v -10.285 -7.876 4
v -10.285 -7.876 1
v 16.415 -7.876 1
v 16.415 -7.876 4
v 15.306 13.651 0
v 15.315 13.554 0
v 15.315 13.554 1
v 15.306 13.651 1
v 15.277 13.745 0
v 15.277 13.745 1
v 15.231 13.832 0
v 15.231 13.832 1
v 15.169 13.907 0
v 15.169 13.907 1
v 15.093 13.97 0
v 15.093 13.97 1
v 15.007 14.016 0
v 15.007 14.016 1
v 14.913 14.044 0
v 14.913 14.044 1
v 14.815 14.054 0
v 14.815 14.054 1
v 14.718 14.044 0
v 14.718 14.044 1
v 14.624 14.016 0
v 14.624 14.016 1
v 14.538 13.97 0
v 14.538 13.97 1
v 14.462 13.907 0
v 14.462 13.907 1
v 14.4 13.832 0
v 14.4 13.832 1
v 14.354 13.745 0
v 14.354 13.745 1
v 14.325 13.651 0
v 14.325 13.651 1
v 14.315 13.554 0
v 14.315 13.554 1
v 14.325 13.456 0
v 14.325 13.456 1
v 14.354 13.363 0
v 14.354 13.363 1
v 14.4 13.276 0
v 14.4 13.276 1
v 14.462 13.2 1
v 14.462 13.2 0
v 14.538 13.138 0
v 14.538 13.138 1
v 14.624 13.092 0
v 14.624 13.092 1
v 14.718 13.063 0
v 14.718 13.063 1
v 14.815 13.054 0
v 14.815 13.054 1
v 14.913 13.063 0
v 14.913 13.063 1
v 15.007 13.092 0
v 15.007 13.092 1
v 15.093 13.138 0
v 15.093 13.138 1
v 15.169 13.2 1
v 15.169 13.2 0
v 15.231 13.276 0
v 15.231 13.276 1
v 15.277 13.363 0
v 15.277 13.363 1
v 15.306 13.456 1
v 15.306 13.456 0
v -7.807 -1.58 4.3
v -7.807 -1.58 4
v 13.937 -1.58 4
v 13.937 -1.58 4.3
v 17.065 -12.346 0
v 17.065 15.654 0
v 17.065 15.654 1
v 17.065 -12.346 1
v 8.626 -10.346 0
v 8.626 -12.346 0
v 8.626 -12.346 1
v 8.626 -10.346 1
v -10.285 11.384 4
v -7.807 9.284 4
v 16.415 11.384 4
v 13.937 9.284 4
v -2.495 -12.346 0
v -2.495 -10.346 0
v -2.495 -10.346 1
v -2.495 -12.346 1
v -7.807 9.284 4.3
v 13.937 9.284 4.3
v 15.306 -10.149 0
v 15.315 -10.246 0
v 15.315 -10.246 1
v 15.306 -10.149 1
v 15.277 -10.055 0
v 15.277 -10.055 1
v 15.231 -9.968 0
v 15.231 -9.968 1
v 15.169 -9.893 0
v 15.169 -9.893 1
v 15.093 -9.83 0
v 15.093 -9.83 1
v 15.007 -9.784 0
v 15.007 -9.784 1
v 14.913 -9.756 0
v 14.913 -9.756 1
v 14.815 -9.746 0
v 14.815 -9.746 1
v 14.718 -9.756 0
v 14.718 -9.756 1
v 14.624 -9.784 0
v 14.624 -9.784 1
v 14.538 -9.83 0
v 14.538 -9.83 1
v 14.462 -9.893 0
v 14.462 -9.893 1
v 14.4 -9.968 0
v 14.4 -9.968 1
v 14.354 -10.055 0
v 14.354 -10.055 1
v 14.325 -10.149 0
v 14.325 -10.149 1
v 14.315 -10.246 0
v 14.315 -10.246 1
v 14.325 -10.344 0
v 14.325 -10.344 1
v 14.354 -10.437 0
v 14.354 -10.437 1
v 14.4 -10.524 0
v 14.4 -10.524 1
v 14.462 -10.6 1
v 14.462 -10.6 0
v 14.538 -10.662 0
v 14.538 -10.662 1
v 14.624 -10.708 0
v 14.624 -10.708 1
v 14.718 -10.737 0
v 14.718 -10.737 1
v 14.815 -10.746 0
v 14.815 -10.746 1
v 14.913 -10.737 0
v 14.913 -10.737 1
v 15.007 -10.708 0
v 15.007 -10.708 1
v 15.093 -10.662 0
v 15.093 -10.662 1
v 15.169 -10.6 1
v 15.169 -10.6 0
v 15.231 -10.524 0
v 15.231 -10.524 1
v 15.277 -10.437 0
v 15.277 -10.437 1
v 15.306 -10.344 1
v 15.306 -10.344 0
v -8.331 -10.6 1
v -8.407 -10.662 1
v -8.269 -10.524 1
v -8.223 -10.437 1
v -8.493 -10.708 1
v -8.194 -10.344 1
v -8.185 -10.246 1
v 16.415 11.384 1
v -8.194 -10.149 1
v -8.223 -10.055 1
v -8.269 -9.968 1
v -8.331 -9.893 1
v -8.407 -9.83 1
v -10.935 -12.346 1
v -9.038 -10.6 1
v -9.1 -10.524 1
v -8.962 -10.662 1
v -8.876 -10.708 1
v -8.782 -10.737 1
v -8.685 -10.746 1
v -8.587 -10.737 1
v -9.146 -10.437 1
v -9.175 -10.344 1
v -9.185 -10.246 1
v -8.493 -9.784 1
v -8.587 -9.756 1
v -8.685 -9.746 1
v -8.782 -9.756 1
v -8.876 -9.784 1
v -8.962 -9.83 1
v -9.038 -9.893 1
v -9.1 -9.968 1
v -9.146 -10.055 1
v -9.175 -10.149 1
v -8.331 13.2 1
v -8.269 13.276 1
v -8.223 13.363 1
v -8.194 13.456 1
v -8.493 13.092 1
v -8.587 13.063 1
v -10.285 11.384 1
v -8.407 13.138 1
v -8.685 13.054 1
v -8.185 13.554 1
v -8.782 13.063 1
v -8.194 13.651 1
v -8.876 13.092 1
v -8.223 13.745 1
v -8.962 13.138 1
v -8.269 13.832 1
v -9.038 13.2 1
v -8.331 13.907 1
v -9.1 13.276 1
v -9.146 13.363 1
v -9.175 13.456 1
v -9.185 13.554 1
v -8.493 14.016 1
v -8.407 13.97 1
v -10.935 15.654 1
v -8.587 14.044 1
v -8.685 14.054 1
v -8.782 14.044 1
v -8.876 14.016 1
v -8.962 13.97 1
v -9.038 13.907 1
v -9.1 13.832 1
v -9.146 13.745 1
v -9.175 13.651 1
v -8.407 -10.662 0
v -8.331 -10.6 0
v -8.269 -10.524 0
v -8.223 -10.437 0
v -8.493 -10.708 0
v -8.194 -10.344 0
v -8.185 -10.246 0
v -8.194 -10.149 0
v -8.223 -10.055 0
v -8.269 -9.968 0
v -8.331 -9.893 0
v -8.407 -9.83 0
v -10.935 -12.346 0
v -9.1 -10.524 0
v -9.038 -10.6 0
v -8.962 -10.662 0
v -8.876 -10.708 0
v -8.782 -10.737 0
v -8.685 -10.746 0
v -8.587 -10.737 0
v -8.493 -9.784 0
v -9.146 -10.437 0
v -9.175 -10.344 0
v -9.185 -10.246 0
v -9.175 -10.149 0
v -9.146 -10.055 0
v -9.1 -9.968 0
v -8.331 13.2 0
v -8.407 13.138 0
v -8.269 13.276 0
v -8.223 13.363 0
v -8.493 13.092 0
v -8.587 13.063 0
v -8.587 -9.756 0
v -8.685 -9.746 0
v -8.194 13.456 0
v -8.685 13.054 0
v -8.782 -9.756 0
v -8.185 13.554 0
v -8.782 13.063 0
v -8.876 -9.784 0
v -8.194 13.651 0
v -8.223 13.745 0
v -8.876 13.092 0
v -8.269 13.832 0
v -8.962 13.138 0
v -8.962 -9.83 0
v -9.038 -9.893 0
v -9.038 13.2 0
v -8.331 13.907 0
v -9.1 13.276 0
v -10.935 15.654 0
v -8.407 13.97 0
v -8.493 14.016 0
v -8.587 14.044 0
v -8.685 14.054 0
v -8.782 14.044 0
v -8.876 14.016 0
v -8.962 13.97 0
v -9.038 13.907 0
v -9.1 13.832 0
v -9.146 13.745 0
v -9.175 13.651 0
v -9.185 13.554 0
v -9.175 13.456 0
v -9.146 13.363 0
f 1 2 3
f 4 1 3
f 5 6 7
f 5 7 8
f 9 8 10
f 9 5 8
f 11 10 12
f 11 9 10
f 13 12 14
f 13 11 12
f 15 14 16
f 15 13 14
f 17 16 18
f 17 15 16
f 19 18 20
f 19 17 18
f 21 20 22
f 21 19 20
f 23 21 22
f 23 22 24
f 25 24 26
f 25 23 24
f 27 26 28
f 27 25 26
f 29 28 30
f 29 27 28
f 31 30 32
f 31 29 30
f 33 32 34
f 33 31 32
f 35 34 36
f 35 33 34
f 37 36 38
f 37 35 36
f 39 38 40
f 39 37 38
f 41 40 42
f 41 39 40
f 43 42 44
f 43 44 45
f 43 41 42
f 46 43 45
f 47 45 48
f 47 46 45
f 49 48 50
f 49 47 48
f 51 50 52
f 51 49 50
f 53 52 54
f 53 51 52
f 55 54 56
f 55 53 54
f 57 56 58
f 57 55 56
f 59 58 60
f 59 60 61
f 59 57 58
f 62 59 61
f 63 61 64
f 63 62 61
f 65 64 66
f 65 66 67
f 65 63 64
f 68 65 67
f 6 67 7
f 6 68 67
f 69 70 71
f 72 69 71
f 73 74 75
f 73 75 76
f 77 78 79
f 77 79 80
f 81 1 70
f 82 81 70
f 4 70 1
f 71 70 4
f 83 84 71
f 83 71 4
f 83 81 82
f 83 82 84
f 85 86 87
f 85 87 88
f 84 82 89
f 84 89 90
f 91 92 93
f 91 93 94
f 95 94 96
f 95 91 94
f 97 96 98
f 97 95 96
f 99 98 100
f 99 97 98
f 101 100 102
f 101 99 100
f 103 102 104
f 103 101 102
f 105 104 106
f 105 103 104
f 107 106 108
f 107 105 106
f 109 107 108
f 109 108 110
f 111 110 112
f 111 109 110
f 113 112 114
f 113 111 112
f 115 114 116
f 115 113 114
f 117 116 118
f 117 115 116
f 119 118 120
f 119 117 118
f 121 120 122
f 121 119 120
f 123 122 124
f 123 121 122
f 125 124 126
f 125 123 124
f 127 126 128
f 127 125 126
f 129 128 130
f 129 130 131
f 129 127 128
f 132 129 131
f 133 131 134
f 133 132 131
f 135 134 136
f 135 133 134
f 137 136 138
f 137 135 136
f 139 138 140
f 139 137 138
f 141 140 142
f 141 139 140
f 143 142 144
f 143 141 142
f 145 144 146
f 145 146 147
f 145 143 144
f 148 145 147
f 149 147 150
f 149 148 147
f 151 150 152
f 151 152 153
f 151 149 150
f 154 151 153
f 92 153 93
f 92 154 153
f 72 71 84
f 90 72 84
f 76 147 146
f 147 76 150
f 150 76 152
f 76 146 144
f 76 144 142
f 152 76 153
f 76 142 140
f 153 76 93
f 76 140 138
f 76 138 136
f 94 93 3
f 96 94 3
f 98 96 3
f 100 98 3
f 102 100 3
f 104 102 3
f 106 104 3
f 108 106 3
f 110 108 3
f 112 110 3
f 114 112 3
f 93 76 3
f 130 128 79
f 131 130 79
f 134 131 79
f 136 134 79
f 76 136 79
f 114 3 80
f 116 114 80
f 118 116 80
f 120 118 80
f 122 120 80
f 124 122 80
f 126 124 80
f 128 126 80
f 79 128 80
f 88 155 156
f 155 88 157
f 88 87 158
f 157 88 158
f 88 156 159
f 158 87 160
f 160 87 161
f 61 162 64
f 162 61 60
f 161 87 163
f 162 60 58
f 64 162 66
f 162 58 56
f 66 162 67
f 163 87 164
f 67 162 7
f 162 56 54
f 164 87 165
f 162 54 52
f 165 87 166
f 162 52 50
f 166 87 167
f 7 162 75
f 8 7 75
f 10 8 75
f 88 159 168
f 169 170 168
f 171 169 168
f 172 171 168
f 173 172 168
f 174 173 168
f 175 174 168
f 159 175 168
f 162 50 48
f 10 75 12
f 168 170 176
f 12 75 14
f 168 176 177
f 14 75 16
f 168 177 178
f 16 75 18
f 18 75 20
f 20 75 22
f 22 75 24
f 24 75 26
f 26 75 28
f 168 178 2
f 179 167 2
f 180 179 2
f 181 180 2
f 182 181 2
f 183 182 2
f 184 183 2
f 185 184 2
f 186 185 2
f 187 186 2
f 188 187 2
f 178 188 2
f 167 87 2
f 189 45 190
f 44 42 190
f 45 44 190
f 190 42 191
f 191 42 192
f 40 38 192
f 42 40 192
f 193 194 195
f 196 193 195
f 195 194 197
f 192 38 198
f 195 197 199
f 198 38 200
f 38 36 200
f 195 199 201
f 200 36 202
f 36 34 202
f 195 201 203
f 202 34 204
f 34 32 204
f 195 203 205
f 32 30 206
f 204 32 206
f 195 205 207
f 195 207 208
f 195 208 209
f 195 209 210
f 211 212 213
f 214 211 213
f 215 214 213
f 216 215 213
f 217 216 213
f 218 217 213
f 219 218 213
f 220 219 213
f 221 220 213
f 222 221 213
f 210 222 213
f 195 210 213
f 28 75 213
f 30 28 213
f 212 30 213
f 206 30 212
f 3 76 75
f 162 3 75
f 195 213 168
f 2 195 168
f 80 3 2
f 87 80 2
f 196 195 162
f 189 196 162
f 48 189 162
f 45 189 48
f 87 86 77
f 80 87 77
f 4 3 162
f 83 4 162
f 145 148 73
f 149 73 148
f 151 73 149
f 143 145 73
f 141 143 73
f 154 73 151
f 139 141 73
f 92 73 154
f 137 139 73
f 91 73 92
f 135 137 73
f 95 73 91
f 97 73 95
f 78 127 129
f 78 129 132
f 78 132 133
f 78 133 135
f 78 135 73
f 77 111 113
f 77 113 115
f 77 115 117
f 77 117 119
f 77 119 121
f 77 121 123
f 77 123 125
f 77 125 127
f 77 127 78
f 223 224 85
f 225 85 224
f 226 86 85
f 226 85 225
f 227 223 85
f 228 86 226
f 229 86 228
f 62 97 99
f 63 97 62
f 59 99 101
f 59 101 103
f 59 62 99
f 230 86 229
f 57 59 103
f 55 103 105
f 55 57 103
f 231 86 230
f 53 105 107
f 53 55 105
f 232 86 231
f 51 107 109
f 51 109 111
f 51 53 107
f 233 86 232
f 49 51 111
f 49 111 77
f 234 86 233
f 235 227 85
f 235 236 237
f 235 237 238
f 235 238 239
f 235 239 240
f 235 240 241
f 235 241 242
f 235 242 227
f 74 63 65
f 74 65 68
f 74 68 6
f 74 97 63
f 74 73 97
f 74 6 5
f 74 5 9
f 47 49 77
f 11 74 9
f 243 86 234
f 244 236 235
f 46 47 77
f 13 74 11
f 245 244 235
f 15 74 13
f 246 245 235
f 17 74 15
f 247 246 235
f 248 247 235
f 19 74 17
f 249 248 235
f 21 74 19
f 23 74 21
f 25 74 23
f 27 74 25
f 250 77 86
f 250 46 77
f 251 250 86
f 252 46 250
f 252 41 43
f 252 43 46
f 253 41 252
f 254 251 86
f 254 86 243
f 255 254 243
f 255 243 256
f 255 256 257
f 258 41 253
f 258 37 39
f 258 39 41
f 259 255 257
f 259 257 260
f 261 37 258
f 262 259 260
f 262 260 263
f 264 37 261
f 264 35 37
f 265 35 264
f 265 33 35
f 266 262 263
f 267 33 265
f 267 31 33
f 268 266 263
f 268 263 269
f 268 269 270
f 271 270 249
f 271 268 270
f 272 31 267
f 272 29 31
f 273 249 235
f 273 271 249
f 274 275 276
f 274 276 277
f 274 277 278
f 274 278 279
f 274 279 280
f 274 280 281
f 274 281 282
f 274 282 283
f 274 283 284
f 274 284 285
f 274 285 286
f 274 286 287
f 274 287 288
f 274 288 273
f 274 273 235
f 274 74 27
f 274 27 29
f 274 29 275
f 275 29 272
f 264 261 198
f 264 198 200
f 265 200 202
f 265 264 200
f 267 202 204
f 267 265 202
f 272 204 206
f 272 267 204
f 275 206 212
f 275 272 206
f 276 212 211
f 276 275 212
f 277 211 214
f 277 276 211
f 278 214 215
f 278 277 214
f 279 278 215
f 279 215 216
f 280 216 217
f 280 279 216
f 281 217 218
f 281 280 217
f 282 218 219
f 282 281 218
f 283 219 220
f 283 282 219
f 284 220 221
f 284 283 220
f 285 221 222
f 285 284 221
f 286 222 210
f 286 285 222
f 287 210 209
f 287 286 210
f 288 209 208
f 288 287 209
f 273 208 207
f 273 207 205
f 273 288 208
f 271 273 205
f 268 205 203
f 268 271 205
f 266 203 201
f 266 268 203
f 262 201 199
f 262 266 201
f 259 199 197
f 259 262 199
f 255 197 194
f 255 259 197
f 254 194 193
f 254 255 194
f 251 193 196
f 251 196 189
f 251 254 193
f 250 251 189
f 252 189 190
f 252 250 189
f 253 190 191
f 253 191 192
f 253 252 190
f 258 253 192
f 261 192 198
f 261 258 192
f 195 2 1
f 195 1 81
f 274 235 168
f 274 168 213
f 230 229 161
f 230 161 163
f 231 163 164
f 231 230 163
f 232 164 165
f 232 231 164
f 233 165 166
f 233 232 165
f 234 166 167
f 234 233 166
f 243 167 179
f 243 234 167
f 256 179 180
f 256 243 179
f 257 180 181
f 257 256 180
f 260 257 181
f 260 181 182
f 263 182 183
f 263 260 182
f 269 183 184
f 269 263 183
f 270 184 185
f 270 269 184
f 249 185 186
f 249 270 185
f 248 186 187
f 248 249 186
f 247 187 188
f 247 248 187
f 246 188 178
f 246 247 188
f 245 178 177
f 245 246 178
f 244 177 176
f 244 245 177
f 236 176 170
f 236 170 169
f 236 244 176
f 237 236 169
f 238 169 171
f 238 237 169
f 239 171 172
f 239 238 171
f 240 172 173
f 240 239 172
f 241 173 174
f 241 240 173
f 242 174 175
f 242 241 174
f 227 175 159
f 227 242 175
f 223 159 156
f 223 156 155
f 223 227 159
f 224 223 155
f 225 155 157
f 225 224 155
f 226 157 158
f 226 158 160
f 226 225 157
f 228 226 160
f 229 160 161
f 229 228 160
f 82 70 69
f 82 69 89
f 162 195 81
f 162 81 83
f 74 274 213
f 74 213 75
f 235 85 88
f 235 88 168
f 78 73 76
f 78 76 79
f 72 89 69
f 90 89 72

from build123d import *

# Parameters (mm, degrees)
ESQUISSE1_R        = 0.5
BOSS_EXTRU_1_DEPTH = 1
ESQUISSE2_W        = 26.7
ESQUISSE2_H        = 19.26
BOSS_EXTRU_2_DEPTH = 3
ESQUISSE4_W        = 21.744
ESQUISSE4_H        = 10.864
BOSS_EXTRU_3_DEPTH = 0.3


with BuildPart() as part:
    # Esquisse1 → Boss.-Extru.1 (new body)
    with BuildSketch(Plane.XY):
        Polygon((-10.934549339, 15.65387995), (17.065450661, 15.65387995), (17.065450661, -12.34612005), (8.625947463, -12.34612005), (8.625947463, -10.34612005), (3.065450661, -10.34612005), (-2.495046141, -10.34612005), (-2.495046141, -12.34612005), (-10.934549339, -12.34612005), align=None)
        with Locations((-8.684549339, -10.24612005)):
            Circle(ESQUISSE1_R, mode=Mode.SUBTRACT)
        with Locations((-8.684549339, 13.55387995)):
            Circle(ESQUISSE1_R, mode=Mode.SUBTRACT)
        with Locations((14.815450661, 13.55387995)):
            Circle(ESQUISSE1_R, mode=Mode.SUBTRACT)
        with Locations((14.815450661, -10.24612005)):
            Circle(ESQUISSE1_R, mode=Mode.SUBTRACT)
    extrude(amount=BOSS_EXTRU_1_DEPTH)

    # Esquisse2 → Boss.-Extru.2 (add)
    with BuildSketch(Plane.XY.offset(1)):
        with Locations((3.065450661, 1.75387995)):
            Rectangle(ESQUISSE2_W, ESQUISSE2_H)
    extrude(amount=BOSS_EXTRU_2_DEPTH)

    # Esquisse4 → Boss.-Extru.3 (add)
    with BuildSketch(Plane.XY.offset(4)):
        with Locations((3.065450661, 3.85187995)):
            Rectangle(ESQUISSE4_W, ESQUISSE4_H)
    extrude(amount=BOSS_EXTRU_3_DEPTH)


solid = part.part
